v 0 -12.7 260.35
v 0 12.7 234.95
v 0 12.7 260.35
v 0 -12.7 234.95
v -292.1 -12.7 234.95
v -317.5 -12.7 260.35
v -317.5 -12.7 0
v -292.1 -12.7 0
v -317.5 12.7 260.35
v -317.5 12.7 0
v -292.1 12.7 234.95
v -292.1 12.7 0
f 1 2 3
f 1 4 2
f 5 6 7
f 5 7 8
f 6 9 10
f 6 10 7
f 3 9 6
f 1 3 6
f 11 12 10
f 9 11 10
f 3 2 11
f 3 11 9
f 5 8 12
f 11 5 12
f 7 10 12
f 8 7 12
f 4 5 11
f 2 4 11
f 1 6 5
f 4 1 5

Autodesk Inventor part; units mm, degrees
ref_plane "XZ Plane" through (0, 0, 0) normal (0, 1, 0) x (-1, 0, 0)
sketch "Sketch5" plane through (0, 0, 0) normal (0, 1, 0) x (-1, 0, 0)
  line L0 (0, 0) -> (0, 247.65) construction
  line L1 (0, 0) -> (304.8, 0) construction
  line L2 (0, 247.65) -> (304.8, 247.65)
  line L3 (304.8, 247.65) -> (304.8, 0)
  dimension "d11" = 247.65
  dimension "d12" = 304.8
sketch "Sketch6" plane through (0, 0, 0) normal (1, 0, 0) x (0, 1, 0)
  line L0 (-12.7, 260.35) -> (-12.7, 234.95)
  line L1 (-12.7, 234.95) -> (12.7, 234.95)
  line L2 (12.7, 234.95) -> (12.7, 260.35)
  line L3 (12.7, 260.35) -> (-12.7, 260.35)
  line L4 (-12.7, 260.35) -> (12.7, 234.95) construction
  line L5 (-12.7, 234.95) -> (12.7, 260.35) construction
  point P0 (0, 0)
  point P1 (0, 247.65)
  dimension "d13" = 25.4
  dimension "d14" = 25.4
  dimension "d15" = 247.65
sweep "Sweep2" add profiles "Sketch6" path "Sketch5"
ref_plane "Work Plane1" through (-304.8, 0, 0) normal (1, 0, 0) x (0, 1, 0)
equation "\"d11\" = width"
equation "\"d12\" = length"
equation "\"d15\" = width"
equation "\"width\" = 247.65"
equation "\"length\" = 304.8"
equation "\"d18\" = -length"
equation "\"height\" = 241.3"
properties part number "topOfFrame"
